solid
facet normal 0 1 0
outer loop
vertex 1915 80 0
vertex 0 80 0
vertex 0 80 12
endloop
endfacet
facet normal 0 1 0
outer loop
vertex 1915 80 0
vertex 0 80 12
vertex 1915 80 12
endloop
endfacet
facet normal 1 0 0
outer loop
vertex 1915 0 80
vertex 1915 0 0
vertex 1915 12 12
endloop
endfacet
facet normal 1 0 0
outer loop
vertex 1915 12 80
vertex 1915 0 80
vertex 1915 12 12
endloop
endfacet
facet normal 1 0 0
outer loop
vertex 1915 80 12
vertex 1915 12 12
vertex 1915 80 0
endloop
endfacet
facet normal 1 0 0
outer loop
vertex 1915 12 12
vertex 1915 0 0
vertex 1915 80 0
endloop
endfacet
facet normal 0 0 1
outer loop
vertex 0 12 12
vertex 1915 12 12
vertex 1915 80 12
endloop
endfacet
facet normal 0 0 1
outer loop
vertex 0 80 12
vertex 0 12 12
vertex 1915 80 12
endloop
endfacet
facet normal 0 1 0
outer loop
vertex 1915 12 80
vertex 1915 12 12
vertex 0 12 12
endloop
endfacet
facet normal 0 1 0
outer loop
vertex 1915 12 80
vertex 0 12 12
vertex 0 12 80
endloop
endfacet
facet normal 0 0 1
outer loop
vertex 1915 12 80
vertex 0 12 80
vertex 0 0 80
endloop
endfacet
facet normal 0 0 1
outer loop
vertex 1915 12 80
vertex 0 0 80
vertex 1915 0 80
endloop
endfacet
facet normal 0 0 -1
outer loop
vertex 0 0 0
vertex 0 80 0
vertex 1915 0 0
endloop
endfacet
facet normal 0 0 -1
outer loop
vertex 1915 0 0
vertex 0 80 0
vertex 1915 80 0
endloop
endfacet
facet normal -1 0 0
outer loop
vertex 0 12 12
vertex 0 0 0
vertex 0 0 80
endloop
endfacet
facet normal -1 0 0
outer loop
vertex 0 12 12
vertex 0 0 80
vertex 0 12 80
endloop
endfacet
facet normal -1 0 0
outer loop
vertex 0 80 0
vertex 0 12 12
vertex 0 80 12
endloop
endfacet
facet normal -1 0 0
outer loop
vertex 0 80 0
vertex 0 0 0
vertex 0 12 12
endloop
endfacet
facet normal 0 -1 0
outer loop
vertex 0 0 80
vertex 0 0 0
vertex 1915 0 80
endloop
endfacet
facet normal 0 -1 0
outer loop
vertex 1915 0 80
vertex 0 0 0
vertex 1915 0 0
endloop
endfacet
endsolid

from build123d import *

# Parameters (mm, degrees)
SKETCH_1_W          = 1915
SKETCH_1_H          = 80
EXTRUDE_1_DEPTH     = 80
SKETCH_3_W          = 68
SKETCH_3_H          = 68
CUT_EXTRUDE_2_DEPTH = 1919.339125389


with BuildPart() as part:
    # 草图1 → 拉伸1 (new body)
    with BuildSketch(Plane.XY):
        with Locations((957.5, 40)):
            Rectangle(SKETCH_1_W, SKETCH_1_H)
    extrude(amount=EXTRUDE_1_DEPTH)

    # 草图3 → 拉伸2 (cut, through all)
    with BuildSketch(Plane.ZY):
        with Locations((46, 46)):
            Rectangle(SKETCH_3_W, SKETCH_3_H)
    extrude(amount=-CUT_EXTRUDE_2_DEPTH, mode=Mode.SUBTRACT)


solid = part.part
